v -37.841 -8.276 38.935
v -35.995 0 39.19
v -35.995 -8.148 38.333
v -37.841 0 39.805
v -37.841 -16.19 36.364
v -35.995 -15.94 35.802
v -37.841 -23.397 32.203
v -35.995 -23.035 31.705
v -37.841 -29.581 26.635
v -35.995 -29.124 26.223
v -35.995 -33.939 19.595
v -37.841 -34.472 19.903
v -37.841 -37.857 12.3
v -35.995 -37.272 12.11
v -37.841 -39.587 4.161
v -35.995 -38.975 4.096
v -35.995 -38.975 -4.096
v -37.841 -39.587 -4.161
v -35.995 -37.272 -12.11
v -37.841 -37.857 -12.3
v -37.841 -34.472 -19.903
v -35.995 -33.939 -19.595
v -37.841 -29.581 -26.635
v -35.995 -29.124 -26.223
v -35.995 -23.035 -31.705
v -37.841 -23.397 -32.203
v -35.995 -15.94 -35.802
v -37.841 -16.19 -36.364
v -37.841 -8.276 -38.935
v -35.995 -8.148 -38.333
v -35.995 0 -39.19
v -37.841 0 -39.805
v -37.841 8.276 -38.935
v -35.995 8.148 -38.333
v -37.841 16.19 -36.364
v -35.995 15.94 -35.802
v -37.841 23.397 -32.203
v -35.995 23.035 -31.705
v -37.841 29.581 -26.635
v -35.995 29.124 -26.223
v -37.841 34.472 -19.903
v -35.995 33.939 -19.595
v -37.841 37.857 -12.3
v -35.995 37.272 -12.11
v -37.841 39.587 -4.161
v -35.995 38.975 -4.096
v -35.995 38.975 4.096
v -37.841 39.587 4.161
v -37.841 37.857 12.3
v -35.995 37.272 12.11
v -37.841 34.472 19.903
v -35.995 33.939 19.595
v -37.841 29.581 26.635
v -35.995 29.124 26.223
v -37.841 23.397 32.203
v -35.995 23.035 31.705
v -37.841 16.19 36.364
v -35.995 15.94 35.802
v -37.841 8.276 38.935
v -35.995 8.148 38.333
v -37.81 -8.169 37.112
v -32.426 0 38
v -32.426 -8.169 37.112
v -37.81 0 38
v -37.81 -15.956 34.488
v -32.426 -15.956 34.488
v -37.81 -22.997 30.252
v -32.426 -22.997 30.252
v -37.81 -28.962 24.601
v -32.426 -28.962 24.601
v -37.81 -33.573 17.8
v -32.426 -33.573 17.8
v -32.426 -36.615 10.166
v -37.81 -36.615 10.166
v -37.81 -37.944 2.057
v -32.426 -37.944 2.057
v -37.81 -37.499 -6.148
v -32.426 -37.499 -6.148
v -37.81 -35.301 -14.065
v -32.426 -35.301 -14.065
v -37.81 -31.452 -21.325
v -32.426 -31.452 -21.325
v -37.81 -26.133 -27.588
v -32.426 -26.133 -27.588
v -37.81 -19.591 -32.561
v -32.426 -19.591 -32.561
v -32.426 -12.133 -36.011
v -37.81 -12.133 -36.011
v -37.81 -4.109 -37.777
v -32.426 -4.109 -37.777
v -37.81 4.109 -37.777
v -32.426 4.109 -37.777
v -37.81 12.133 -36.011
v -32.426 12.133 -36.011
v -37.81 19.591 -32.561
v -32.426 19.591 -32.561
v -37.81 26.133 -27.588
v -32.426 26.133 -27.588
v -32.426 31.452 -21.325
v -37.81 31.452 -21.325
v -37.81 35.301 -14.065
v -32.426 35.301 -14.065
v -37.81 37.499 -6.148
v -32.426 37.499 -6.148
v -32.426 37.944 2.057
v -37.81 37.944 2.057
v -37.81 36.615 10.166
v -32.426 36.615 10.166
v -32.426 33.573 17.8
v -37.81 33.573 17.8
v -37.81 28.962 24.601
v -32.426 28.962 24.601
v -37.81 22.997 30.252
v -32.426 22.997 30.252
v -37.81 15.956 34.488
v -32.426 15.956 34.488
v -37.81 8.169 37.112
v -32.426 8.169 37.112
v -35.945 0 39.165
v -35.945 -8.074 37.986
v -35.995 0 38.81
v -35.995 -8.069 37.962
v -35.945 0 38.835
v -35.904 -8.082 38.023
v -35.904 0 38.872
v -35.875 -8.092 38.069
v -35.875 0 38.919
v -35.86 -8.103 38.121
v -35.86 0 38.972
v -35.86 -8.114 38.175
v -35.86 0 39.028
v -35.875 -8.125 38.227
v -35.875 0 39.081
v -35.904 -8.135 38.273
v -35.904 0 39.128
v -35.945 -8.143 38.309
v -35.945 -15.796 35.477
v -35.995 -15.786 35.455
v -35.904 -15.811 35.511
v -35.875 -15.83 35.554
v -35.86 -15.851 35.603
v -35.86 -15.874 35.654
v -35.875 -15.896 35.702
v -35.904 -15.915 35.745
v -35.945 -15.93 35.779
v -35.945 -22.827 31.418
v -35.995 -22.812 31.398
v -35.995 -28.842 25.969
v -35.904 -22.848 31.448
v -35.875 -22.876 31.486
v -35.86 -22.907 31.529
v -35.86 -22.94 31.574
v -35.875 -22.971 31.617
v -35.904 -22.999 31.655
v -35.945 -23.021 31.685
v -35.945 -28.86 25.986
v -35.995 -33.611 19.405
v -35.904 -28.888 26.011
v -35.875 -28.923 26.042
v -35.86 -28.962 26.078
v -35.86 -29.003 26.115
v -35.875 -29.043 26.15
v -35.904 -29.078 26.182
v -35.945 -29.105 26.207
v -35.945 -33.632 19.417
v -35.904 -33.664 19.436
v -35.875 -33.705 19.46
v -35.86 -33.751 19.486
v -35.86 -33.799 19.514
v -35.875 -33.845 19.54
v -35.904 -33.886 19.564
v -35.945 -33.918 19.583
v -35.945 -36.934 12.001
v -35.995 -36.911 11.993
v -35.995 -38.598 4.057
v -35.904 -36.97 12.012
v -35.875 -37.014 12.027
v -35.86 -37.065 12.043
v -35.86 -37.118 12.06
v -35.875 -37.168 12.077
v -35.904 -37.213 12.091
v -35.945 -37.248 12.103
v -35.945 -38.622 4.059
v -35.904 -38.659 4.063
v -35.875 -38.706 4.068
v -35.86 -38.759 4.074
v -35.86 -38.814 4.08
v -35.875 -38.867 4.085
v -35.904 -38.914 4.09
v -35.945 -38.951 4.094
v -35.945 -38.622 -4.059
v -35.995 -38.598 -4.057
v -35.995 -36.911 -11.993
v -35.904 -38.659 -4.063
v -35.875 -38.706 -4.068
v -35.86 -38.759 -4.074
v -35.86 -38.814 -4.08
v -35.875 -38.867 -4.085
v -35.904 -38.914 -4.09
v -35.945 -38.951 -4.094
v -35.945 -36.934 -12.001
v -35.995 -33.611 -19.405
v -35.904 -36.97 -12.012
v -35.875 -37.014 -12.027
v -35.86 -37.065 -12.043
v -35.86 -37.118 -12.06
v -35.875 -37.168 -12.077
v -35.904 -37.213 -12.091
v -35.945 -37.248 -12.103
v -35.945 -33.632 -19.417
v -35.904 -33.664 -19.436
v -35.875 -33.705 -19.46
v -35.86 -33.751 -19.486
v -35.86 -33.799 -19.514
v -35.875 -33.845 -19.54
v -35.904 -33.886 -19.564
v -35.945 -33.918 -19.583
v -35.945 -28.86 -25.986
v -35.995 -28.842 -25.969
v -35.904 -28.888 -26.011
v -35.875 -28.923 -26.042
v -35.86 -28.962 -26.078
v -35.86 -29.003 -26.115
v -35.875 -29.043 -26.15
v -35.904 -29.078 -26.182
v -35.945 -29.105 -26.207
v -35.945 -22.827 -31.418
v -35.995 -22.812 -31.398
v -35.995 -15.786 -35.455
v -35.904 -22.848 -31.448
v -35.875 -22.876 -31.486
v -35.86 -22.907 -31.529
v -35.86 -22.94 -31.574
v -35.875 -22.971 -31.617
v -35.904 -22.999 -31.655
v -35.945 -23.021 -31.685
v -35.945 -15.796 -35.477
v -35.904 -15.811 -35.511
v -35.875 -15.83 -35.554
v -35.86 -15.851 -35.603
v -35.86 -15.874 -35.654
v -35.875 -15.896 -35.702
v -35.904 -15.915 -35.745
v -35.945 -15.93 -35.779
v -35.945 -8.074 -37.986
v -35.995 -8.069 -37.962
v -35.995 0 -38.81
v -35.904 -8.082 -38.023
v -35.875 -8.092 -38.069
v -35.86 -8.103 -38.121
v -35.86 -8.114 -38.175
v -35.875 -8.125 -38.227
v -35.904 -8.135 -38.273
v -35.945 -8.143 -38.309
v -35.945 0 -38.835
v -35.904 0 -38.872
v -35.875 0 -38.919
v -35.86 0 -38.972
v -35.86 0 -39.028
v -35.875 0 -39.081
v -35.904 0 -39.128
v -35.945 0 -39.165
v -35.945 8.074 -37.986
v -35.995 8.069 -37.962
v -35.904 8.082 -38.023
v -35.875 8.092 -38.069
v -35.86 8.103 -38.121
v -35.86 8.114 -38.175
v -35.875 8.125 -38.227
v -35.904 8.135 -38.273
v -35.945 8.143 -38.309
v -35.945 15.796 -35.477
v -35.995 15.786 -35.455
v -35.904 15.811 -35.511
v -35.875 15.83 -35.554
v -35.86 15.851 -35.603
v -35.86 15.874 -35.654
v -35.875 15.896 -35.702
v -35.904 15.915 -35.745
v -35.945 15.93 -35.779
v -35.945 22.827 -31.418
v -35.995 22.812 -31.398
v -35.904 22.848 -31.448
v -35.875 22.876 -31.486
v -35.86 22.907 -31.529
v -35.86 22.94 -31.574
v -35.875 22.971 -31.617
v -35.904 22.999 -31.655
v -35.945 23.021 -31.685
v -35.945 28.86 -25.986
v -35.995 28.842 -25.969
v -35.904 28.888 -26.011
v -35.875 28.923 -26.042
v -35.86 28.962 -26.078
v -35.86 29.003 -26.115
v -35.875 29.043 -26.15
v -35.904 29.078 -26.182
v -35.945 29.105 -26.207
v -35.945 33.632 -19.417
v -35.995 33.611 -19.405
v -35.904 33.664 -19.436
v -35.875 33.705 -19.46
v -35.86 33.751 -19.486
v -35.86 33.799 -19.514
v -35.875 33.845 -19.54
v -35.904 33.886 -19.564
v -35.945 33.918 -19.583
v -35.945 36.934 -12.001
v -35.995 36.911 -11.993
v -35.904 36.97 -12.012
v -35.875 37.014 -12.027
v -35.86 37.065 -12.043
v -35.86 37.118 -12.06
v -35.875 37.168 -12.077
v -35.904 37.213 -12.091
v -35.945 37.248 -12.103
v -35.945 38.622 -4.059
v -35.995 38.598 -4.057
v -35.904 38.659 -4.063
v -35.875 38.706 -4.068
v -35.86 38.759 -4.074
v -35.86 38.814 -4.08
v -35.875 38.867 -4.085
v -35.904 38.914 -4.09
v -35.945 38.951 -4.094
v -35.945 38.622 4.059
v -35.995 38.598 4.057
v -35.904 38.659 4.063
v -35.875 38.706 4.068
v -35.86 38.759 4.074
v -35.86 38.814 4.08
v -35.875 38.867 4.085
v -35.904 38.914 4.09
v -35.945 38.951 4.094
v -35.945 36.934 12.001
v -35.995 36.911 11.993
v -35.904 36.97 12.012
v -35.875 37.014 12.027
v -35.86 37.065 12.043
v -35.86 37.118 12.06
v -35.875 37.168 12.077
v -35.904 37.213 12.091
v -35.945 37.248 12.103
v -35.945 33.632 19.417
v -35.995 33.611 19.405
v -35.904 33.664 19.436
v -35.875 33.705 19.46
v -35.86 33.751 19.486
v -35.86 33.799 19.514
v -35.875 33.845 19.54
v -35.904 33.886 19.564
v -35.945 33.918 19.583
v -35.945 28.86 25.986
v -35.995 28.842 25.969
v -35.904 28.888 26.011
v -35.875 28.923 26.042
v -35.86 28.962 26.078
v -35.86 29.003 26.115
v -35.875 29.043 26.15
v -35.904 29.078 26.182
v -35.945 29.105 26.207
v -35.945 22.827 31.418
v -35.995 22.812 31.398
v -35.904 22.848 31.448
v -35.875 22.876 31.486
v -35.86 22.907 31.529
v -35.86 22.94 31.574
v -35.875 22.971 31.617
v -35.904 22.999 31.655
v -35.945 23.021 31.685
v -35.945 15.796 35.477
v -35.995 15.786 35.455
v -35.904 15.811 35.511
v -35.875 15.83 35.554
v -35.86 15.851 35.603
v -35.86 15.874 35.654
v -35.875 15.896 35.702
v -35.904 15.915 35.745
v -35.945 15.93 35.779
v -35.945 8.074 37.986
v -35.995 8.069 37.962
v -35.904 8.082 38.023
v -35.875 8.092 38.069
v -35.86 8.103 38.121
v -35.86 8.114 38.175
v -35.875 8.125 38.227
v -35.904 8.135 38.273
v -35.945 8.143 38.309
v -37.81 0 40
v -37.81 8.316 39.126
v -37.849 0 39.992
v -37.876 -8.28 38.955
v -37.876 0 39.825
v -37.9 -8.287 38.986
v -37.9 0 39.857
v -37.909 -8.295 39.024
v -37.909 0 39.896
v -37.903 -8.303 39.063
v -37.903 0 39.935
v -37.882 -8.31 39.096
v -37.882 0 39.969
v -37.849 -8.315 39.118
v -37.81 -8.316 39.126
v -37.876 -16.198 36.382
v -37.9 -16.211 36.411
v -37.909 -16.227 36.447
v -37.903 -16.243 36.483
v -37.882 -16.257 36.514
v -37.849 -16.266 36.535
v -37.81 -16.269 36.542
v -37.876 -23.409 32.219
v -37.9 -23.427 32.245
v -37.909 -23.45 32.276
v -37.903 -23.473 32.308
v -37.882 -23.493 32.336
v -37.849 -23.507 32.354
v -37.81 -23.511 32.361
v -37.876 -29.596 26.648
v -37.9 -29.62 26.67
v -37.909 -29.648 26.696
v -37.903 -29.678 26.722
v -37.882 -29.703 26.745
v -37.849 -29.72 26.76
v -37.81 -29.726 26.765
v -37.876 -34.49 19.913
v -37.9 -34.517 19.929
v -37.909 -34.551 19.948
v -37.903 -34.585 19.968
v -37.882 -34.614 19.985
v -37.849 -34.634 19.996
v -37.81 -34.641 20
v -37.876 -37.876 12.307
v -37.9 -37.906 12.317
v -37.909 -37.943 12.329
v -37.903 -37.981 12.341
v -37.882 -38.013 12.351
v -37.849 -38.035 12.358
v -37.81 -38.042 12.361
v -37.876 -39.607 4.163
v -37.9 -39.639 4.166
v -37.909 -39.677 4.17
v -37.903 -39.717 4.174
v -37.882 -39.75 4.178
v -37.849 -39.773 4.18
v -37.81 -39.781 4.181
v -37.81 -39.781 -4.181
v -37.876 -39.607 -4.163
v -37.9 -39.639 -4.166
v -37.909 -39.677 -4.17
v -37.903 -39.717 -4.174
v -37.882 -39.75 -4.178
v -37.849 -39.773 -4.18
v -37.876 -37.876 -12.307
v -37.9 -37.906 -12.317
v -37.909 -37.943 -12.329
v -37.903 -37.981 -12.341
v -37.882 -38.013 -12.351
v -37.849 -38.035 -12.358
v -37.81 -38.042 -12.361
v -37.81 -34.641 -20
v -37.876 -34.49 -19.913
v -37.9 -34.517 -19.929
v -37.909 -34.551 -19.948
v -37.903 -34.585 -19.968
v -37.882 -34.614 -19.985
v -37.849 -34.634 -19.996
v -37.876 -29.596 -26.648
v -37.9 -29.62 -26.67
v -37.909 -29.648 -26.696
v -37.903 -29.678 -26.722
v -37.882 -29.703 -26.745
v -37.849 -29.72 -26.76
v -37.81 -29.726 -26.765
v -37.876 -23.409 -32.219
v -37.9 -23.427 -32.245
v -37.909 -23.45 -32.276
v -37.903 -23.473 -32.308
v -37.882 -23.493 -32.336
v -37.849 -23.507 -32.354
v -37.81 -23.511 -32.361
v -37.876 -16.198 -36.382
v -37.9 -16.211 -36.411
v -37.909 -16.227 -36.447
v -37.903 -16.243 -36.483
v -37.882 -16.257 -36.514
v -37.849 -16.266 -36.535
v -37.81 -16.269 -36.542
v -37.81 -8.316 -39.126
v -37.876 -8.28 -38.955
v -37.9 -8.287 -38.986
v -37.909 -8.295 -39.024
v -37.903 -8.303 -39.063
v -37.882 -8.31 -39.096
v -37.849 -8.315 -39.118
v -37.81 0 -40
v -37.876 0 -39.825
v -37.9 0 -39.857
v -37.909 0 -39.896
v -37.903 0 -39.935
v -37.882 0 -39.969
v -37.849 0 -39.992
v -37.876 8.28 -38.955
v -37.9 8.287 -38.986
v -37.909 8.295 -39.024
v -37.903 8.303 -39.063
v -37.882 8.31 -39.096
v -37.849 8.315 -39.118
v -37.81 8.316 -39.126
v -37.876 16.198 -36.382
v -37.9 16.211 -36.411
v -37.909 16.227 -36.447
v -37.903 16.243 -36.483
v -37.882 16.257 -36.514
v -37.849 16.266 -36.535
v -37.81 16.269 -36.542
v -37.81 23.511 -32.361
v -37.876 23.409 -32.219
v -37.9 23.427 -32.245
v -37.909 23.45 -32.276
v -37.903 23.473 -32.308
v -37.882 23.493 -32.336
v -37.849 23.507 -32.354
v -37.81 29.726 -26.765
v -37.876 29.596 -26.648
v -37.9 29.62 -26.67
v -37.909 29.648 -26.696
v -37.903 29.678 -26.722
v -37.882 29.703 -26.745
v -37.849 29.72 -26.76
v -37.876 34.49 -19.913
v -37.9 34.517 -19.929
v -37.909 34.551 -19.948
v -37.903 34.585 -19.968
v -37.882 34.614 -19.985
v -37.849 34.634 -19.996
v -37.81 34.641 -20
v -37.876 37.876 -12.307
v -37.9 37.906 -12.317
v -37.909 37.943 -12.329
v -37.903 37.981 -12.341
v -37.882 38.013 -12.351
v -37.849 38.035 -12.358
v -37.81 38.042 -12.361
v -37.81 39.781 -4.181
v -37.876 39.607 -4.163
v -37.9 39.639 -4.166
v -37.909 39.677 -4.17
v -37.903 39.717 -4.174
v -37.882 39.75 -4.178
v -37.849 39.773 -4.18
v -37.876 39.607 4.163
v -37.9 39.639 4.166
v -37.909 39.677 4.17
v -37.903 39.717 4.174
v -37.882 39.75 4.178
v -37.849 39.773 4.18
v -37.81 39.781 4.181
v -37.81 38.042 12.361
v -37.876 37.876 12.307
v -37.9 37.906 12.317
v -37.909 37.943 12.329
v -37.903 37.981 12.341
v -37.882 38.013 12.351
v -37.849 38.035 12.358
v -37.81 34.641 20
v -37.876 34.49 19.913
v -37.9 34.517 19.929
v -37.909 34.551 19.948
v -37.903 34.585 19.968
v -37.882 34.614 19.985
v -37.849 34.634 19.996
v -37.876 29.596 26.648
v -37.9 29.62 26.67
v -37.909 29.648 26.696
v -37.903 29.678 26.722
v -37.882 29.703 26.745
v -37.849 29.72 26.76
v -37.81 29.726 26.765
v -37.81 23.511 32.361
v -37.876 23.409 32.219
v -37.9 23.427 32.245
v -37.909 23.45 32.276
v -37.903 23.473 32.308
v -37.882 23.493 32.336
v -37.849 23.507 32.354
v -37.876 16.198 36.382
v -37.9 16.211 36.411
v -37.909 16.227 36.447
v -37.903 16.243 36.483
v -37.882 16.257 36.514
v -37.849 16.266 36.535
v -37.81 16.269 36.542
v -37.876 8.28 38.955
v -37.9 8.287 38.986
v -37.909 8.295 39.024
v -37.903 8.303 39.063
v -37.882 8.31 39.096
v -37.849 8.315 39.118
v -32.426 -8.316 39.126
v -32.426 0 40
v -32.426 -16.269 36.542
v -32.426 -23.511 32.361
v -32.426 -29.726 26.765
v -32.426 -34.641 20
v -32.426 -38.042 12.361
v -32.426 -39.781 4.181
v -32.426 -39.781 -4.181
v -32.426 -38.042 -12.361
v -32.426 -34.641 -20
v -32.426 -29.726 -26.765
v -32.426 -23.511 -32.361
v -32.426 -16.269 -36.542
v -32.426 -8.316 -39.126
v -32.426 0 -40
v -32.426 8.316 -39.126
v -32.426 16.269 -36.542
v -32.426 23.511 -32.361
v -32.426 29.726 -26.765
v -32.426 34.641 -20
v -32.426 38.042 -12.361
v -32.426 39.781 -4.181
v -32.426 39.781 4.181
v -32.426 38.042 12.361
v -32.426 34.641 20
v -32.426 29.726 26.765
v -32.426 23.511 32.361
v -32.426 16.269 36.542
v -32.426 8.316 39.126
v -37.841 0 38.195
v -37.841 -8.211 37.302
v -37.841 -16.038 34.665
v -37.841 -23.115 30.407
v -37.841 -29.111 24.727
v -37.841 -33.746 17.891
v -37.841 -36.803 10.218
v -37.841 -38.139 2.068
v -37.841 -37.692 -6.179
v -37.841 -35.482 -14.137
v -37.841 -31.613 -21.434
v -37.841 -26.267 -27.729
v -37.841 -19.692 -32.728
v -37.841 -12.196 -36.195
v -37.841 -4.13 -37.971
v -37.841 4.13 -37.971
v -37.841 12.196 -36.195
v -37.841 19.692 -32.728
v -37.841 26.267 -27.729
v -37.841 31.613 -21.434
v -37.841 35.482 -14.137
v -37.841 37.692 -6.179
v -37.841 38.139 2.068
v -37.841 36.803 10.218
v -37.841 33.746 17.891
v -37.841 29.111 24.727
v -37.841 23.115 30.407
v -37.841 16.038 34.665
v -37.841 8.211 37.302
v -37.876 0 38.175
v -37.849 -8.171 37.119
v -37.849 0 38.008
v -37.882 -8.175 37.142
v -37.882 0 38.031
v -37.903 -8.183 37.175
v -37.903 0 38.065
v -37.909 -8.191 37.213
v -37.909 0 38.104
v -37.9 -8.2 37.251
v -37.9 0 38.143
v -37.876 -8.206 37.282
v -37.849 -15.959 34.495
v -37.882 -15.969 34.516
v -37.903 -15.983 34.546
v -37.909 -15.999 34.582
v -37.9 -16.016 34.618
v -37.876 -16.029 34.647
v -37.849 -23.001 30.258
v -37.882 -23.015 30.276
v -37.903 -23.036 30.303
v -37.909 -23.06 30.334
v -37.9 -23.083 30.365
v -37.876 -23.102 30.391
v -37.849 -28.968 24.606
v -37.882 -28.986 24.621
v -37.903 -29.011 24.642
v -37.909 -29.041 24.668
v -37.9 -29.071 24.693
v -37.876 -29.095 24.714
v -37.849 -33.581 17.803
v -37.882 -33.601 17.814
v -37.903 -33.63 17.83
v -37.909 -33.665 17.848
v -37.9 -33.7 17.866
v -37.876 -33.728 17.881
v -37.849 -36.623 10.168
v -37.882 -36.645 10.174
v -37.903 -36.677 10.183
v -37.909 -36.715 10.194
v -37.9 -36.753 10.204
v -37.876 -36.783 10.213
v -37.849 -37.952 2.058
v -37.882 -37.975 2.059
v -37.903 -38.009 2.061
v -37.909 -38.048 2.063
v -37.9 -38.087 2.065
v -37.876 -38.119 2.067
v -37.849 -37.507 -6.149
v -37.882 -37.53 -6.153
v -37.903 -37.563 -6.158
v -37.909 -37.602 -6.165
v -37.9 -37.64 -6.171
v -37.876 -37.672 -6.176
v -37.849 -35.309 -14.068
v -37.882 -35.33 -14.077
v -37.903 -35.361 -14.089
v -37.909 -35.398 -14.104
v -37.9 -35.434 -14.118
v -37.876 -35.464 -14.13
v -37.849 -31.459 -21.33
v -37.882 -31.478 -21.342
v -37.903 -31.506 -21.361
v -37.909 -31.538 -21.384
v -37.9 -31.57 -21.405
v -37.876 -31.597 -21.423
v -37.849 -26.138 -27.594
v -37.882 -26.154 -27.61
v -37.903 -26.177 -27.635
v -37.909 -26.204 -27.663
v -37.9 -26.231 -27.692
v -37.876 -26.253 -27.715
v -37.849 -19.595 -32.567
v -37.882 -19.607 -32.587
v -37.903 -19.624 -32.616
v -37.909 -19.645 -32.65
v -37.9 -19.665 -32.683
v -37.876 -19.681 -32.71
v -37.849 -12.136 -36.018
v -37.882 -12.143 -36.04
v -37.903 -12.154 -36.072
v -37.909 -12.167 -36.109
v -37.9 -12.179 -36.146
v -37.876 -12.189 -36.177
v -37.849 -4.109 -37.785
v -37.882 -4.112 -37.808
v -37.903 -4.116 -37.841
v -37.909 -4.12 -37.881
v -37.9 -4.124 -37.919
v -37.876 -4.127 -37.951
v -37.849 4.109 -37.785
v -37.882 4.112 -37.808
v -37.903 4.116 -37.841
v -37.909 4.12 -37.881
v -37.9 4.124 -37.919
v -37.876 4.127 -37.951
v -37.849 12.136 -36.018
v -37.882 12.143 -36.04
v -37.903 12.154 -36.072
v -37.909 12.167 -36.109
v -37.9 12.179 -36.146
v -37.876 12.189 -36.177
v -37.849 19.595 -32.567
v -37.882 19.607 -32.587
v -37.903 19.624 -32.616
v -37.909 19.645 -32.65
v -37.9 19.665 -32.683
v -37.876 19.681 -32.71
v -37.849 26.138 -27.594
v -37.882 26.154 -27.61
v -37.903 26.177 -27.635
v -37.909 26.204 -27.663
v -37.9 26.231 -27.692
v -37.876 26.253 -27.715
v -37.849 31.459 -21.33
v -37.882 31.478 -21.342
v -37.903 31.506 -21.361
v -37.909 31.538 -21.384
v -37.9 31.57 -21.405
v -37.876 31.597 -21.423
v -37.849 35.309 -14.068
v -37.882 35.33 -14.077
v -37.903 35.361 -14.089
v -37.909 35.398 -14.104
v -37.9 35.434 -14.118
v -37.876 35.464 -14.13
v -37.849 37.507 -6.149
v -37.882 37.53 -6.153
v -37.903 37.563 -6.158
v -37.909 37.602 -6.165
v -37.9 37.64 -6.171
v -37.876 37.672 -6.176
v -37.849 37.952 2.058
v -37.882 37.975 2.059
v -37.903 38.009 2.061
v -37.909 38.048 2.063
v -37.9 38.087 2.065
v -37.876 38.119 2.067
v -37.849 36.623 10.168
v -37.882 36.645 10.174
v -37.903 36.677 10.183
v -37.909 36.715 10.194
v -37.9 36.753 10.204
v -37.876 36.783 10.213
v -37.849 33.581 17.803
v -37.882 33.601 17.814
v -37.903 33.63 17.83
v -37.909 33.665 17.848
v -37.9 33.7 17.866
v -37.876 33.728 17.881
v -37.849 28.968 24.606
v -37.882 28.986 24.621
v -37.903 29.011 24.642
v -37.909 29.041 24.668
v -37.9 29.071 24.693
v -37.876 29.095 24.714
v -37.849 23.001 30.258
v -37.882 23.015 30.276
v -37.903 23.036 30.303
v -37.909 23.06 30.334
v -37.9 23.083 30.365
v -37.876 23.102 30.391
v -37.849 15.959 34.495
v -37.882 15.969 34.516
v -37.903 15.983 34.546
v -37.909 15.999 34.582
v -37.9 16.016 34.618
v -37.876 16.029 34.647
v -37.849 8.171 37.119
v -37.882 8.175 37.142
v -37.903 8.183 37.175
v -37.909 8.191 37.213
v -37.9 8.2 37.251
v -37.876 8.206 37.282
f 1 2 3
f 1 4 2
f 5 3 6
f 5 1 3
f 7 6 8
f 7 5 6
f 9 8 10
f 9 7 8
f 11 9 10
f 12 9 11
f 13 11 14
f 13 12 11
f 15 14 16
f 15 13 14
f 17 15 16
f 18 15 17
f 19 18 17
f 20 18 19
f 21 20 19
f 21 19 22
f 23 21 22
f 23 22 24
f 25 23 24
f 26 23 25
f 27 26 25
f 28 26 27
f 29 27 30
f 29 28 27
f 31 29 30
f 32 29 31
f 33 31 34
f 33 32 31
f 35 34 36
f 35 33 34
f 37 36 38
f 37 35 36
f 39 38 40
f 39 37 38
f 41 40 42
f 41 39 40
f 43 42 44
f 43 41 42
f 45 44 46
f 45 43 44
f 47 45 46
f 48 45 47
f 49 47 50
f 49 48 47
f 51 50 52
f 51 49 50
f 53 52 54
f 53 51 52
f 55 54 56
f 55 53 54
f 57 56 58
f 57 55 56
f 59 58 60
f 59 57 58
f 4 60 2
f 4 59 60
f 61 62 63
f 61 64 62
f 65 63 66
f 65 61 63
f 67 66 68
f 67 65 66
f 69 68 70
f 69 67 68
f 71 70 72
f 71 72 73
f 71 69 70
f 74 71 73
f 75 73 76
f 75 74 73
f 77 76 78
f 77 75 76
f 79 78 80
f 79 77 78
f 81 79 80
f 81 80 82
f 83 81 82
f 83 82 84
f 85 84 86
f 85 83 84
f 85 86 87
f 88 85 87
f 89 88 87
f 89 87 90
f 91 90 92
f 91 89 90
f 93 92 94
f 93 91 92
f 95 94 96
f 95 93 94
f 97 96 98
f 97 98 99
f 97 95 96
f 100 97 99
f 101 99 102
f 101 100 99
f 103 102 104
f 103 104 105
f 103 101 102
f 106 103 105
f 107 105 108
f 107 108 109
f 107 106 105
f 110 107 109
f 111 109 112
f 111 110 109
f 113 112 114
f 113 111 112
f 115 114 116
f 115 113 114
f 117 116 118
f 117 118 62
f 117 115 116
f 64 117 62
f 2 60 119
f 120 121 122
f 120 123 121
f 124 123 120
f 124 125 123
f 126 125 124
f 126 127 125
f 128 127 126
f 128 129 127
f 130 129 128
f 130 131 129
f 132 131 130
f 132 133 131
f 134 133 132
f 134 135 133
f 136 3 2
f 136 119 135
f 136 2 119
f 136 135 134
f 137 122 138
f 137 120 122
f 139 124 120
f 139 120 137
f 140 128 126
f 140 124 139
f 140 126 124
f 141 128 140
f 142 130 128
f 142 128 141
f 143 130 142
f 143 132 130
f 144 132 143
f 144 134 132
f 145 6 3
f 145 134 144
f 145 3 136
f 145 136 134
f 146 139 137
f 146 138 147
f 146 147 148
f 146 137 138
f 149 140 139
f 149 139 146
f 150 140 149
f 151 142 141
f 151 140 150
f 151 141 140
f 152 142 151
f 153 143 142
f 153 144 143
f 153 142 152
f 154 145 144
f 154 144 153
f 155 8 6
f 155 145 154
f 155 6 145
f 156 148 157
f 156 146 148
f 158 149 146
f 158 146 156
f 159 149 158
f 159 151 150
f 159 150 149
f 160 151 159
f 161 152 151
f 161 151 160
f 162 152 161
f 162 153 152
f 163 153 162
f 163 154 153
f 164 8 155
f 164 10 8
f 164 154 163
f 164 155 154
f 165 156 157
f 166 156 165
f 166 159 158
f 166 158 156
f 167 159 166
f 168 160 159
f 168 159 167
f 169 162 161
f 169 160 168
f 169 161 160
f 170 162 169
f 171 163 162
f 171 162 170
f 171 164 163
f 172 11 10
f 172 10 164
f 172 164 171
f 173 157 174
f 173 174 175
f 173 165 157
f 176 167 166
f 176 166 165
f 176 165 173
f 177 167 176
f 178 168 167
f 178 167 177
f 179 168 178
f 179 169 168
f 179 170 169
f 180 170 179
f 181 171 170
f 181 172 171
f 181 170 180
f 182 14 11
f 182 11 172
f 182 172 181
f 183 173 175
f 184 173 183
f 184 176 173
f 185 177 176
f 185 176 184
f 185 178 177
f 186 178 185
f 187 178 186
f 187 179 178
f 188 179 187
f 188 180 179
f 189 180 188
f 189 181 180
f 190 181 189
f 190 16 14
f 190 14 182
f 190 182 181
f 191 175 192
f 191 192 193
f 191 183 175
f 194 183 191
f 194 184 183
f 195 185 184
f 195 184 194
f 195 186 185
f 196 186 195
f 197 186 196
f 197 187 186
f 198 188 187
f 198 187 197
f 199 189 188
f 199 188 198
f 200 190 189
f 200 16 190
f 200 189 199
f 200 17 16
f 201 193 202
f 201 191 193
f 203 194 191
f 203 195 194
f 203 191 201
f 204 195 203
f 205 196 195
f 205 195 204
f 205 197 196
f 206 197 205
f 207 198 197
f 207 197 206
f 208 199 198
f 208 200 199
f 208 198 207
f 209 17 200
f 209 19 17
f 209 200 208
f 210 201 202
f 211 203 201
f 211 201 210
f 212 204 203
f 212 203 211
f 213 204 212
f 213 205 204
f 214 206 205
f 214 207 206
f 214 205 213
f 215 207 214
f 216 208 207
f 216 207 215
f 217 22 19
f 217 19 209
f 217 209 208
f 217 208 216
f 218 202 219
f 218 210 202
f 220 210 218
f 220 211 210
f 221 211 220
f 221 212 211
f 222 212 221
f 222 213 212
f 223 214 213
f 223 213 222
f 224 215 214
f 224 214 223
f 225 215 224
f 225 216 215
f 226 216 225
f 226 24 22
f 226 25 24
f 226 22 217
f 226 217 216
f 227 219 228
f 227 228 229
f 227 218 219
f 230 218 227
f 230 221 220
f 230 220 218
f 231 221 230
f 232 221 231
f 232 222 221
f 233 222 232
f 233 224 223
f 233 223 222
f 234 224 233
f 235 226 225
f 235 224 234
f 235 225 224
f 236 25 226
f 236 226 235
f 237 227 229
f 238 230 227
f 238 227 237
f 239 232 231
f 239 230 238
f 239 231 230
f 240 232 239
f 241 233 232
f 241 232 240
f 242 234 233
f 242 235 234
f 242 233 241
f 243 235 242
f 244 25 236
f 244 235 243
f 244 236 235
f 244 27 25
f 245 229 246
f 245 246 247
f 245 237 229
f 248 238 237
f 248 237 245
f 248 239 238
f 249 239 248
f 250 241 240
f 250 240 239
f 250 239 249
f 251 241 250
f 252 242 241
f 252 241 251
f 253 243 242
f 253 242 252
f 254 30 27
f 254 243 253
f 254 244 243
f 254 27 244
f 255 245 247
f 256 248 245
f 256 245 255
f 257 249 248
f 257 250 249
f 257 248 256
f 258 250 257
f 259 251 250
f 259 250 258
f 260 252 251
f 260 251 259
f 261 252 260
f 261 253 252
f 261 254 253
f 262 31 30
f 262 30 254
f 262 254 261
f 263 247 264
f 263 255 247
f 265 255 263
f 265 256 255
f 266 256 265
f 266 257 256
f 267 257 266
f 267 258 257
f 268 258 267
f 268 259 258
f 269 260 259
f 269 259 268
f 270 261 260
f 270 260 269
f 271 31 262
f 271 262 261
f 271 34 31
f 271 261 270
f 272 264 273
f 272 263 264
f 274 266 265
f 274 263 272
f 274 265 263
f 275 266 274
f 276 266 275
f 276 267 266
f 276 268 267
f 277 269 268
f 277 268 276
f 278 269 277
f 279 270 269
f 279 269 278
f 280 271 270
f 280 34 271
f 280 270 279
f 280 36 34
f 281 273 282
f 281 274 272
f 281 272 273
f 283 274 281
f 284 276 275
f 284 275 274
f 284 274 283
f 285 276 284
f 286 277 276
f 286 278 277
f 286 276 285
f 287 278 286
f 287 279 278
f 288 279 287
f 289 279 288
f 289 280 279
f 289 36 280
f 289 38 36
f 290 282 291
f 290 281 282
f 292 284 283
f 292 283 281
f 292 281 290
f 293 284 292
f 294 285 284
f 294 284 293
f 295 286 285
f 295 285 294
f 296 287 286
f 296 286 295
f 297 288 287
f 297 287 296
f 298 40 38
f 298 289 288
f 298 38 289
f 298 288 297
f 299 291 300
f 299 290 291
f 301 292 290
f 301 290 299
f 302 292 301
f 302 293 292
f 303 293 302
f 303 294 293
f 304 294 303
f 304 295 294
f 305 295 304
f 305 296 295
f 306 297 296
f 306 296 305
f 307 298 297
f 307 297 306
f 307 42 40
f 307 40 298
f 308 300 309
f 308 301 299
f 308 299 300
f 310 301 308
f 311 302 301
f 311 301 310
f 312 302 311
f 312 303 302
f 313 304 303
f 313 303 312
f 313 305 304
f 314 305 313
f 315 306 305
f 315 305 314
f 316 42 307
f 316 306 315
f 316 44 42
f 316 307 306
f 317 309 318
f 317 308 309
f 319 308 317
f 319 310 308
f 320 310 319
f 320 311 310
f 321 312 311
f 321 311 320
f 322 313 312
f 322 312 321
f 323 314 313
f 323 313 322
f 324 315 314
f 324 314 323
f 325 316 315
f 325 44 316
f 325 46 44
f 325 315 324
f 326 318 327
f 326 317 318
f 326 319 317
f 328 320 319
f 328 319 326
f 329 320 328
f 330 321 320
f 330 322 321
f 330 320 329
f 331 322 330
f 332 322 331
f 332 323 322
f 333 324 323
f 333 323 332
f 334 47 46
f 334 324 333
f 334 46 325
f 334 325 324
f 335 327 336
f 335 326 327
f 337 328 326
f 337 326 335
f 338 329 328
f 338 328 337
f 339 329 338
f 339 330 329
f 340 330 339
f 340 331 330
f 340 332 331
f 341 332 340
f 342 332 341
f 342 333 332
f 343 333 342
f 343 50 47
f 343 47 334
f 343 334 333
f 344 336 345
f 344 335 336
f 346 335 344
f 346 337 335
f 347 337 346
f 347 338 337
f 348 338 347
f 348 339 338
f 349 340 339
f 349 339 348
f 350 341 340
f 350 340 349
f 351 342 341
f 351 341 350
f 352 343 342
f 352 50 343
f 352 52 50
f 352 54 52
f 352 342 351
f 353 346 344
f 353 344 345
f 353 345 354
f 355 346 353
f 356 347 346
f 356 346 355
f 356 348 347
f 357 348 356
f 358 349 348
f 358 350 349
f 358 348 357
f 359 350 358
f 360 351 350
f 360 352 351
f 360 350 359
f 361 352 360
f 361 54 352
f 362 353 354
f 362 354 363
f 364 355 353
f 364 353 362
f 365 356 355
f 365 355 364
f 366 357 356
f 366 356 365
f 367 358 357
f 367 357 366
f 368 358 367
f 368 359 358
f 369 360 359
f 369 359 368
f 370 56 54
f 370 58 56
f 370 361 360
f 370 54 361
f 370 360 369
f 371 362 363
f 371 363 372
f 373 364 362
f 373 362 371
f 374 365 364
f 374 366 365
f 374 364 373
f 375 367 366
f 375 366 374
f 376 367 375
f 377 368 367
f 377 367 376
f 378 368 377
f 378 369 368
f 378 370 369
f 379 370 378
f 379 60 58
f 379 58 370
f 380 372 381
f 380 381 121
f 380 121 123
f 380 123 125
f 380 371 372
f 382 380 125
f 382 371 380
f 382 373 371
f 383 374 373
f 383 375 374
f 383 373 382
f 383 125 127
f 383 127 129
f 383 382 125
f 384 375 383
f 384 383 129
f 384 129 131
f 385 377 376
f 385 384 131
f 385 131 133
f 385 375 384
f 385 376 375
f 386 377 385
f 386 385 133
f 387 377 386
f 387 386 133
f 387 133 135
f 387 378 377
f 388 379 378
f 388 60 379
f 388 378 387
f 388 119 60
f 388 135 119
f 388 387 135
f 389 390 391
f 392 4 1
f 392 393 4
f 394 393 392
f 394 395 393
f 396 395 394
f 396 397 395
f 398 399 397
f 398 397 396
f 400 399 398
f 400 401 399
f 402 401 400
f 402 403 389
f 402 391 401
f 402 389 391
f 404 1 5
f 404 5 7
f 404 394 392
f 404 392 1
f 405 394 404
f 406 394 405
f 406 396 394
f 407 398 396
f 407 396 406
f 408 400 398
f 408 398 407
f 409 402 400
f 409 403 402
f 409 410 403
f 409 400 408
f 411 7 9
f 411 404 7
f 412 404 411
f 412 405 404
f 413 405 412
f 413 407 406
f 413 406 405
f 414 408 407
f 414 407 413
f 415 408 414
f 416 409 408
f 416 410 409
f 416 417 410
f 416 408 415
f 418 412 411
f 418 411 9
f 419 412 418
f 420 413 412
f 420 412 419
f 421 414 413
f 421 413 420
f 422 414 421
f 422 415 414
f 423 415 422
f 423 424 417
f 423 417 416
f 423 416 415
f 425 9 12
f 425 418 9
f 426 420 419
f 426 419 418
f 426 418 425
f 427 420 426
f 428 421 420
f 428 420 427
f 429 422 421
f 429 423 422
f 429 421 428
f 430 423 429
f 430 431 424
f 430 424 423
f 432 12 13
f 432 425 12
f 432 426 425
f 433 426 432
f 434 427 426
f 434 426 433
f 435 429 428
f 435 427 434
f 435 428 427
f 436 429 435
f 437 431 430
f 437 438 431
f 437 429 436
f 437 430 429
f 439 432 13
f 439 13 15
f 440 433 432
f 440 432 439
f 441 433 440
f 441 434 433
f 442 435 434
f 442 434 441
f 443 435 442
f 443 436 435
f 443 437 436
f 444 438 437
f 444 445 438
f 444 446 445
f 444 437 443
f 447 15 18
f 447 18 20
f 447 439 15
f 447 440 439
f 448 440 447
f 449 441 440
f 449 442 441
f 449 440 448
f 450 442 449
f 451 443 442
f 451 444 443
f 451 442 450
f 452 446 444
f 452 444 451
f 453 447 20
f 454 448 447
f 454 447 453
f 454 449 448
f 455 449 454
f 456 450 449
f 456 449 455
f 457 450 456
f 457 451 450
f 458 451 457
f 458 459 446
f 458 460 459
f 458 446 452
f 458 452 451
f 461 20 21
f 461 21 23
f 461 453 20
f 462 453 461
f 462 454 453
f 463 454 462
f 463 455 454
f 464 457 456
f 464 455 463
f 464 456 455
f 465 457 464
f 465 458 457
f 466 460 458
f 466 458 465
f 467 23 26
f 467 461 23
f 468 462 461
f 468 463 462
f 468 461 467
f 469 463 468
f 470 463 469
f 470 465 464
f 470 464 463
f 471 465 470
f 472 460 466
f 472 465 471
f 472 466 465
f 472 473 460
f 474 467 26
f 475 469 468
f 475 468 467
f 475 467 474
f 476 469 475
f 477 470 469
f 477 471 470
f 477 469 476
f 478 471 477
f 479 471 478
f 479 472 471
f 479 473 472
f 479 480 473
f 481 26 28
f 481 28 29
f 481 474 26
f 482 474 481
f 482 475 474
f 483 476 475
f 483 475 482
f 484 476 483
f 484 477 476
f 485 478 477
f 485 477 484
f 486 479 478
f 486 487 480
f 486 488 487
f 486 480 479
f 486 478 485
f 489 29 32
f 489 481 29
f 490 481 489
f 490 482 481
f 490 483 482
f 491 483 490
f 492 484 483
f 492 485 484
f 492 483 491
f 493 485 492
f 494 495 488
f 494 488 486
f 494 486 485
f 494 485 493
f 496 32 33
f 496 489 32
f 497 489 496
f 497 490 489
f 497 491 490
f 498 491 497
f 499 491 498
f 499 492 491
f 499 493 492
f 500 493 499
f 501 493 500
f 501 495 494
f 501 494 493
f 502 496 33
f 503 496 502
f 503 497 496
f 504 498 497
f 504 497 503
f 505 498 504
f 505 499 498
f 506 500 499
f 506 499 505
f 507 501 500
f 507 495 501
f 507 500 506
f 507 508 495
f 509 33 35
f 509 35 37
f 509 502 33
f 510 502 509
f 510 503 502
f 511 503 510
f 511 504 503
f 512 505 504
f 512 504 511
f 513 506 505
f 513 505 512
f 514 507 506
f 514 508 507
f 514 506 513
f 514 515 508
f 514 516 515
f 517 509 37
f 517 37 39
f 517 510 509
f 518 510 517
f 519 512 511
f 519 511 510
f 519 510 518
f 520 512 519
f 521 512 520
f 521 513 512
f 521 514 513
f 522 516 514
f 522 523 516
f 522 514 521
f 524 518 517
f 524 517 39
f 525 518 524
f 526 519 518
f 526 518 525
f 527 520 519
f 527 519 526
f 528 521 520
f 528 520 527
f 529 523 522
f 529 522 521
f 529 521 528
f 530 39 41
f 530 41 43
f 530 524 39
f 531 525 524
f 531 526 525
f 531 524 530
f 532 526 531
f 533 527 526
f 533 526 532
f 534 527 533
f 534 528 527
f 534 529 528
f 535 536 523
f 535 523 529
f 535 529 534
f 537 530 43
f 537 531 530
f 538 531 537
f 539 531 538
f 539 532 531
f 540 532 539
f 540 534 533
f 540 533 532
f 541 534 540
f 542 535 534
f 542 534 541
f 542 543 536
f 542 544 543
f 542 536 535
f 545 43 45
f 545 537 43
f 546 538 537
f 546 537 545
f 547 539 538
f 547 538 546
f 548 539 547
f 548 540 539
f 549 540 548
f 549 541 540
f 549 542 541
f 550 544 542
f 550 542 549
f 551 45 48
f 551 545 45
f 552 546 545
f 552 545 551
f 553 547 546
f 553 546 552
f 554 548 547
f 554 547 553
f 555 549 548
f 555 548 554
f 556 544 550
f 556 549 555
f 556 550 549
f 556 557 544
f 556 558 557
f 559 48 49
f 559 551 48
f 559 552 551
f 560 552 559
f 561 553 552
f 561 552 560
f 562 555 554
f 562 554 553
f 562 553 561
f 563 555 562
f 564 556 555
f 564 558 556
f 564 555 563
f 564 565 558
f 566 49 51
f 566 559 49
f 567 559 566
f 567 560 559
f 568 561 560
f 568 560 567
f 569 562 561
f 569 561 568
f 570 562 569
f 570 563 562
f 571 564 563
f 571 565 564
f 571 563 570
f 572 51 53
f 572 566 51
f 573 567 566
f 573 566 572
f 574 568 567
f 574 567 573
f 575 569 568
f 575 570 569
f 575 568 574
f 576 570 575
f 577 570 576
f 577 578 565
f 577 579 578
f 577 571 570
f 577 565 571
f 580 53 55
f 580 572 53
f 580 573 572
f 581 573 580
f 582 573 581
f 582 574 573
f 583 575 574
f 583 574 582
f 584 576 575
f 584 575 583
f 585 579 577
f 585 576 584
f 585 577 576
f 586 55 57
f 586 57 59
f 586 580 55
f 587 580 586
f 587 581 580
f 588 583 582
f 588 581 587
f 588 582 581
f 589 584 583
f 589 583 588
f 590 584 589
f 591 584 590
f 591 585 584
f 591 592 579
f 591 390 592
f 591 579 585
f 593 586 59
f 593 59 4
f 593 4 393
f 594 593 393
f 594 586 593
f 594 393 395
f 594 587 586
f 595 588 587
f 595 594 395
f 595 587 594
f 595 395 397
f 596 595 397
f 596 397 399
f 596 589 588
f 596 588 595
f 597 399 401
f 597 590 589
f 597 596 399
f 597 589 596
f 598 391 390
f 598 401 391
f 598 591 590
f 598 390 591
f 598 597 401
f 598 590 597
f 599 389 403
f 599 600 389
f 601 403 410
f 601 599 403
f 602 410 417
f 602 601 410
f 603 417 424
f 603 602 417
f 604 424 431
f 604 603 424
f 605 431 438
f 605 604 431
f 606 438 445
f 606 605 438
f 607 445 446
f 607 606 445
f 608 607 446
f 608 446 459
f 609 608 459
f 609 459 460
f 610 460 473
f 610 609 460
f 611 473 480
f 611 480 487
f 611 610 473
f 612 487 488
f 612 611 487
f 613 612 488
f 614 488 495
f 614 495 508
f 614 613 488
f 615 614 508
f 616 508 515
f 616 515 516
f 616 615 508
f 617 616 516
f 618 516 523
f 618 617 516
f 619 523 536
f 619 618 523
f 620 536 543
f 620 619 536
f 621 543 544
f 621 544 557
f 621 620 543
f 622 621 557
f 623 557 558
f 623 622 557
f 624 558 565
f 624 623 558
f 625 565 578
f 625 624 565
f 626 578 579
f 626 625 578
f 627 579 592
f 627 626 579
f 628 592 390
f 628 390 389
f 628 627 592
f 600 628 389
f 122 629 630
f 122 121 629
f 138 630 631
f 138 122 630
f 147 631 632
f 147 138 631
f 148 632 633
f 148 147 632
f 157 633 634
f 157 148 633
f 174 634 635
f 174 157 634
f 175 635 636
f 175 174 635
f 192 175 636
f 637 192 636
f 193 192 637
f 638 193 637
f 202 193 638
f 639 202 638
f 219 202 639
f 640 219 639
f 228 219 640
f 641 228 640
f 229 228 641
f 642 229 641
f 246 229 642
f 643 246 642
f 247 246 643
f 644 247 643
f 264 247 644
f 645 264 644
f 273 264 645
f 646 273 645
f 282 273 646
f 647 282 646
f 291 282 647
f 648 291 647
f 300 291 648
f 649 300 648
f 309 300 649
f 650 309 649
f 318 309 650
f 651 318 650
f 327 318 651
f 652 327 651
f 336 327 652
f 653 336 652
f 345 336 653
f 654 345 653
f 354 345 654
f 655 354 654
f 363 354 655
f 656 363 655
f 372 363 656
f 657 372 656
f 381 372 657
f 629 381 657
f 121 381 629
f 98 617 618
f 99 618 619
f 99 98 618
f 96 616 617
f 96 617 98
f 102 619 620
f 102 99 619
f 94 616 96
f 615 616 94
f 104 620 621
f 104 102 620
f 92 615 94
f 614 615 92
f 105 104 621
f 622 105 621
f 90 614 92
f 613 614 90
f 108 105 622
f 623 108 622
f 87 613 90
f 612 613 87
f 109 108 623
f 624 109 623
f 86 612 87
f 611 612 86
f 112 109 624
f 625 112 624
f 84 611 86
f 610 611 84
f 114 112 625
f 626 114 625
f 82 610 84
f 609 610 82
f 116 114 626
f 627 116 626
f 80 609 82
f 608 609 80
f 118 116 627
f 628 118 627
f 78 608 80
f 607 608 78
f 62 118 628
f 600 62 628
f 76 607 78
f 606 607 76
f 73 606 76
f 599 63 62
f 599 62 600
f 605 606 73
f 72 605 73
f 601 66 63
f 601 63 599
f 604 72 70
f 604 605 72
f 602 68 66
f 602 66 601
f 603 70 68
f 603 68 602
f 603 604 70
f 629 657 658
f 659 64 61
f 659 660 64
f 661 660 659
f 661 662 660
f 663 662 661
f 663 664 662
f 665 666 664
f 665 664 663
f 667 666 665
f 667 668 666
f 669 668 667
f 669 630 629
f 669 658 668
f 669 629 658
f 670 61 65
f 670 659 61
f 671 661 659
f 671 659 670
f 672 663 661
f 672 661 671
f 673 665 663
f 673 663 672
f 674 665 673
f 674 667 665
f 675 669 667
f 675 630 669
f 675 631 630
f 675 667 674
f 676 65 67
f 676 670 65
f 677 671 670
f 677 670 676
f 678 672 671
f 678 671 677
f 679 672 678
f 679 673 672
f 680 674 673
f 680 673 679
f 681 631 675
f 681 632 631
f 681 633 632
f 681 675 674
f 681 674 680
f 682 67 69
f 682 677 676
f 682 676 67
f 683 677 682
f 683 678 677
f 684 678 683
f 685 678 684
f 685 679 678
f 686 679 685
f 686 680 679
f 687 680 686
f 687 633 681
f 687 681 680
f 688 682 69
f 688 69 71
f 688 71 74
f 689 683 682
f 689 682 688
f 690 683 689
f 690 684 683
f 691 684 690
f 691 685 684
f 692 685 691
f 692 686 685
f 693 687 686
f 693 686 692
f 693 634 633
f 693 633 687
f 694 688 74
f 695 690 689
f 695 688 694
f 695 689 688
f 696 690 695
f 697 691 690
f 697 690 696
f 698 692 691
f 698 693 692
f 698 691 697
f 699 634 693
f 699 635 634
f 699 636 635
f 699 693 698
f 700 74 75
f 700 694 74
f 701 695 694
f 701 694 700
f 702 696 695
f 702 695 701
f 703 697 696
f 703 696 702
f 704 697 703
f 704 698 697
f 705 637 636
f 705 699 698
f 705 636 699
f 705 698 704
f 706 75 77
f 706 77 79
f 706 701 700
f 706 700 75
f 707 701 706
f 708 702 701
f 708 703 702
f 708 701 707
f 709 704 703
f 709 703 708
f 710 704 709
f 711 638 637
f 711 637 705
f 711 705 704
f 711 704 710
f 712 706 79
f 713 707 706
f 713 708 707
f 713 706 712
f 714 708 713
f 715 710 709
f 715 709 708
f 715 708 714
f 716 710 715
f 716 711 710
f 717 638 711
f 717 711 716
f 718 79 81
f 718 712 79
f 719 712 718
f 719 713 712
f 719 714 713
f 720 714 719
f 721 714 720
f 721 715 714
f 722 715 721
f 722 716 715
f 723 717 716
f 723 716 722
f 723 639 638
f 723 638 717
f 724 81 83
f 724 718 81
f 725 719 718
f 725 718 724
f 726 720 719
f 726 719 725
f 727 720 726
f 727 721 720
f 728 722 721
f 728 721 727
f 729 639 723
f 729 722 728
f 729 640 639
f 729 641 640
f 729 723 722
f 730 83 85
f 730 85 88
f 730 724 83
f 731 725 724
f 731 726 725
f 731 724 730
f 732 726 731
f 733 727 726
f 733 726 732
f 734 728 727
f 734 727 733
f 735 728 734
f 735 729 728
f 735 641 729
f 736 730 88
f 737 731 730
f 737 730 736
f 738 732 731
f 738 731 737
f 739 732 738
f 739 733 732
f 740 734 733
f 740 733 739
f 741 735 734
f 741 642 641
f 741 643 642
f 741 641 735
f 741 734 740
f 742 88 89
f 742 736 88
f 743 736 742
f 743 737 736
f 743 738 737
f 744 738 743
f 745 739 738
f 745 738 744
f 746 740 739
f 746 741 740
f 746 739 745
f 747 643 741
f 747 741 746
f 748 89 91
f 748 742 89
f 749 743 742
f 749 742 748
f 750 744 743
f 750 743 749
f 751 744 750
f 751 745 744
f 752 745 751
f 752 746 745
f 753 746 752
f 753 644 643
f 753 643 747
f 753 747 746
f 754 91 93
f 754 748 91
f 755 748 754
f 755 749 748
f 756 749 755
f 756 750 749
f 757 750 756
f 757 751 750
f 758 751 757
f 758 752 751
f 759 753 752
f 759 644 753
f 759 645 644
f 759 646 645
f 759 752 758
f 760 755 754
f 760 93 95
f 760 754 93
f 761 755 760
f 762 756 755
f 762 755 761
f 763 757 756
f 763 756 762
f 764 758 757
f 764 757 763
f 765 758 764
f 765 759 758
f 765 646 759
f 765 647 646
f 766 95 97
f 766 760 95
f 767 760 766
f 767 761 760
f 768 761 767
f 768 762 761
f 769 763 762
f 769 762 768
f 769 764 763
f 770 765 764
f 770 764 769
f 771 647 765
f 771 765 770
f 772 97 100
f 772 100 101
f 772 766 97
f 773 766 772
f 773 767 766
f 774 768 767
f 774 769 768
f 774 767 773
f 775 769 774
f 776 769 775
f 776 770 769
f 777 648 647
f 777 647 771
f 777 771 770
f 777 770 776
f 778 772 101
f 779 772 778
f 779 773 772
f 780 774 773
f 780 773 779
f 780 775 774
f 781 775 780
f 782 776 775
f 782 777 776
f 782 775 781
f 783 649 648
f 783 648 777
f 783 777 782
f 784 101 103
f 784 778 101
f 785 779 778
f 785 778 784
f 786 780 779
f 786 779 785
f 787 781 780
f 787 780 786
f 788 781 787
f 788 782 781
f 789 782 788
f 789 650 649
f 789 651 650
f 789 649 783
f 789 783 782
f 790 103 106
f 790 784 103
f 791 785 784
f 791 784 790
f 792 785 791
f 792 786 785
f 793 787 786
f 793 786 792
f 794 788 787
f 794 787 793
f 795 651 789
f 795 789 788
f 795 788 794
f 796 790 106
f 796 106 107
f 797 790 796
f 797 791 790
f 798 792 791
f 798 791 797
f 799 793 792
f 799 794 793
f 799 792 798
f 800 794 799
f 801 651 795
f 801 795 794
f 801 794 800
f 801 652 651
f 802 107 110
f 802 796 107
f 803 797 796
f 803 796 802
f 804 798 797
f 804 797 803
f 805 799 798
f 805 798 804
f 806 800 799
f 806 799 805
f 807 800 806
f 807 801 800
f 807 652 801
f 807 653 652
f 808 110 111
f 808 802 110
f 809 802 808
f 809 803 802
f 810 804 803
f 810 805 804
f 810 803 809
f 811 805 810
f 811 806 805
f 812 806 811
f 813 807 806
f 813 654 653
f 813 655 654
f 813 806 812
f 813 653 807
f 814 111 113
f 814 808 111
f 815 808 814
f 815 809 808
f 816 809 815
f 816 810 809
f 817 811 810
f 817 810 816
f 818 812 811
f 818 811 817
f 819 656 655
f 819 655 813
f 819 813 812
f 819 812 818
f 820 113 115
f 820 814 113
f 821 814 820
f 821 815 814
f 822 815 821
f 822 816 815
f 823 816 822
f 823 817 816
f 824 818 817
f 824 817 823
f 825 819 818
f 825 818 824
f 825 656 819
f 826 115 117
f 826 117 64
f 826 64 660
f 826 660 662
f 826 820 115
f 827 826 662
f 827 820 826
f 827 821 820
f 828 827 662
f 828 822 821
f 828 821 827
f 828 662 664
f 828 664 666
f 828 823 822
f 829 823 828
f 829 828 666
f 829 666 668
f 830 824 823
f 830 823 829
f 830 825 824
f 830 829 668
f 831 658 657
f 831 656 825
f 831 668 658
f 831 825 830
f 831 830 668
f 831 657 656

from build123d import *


with BuildPart() as part:
    # Sketch1 → Revolve1 (revolve)
    with BuildSketch(Plane.XY, mode=Mode.PRIVATE) as revolve1_sk:
        with BuildLine():
            Line((-37.809513487, -40), (-32.425741253, -40))
            Line((-32.425741253, -40), (-32.425741253, -38))
            Line((-32.425741253, -38), (-37.809513487, -38))
            ThreePointArc((-37.809513487, -38), (-37.908222233, -38.083981776), (-37.841136263, -38.19486833))
            Line((-37.841136263, -38.19486833), (-35.994951232, -38.81026334))
            ThreePointArc((-35.994951232, -38.81026334), (-35.858196785, -39), (-35.994951232, -39.18973666))
            Line((-35.994951232, -39.18973666), (-37.841136263, -39.80513167))
            ThreePointArc((-37.841136263, -39.80513167), (-37.908222233, -39.916018224), (-37.809513487, -40))
        make_face()
    revolve(revolve1_sk.sketch.rotate(Axis((-83.208746897, 0, 0), (1, 0, 0)), 270), axis=Axis((-83.208746897, 0, 0), (1, 0, 0)))


solid = part.part
